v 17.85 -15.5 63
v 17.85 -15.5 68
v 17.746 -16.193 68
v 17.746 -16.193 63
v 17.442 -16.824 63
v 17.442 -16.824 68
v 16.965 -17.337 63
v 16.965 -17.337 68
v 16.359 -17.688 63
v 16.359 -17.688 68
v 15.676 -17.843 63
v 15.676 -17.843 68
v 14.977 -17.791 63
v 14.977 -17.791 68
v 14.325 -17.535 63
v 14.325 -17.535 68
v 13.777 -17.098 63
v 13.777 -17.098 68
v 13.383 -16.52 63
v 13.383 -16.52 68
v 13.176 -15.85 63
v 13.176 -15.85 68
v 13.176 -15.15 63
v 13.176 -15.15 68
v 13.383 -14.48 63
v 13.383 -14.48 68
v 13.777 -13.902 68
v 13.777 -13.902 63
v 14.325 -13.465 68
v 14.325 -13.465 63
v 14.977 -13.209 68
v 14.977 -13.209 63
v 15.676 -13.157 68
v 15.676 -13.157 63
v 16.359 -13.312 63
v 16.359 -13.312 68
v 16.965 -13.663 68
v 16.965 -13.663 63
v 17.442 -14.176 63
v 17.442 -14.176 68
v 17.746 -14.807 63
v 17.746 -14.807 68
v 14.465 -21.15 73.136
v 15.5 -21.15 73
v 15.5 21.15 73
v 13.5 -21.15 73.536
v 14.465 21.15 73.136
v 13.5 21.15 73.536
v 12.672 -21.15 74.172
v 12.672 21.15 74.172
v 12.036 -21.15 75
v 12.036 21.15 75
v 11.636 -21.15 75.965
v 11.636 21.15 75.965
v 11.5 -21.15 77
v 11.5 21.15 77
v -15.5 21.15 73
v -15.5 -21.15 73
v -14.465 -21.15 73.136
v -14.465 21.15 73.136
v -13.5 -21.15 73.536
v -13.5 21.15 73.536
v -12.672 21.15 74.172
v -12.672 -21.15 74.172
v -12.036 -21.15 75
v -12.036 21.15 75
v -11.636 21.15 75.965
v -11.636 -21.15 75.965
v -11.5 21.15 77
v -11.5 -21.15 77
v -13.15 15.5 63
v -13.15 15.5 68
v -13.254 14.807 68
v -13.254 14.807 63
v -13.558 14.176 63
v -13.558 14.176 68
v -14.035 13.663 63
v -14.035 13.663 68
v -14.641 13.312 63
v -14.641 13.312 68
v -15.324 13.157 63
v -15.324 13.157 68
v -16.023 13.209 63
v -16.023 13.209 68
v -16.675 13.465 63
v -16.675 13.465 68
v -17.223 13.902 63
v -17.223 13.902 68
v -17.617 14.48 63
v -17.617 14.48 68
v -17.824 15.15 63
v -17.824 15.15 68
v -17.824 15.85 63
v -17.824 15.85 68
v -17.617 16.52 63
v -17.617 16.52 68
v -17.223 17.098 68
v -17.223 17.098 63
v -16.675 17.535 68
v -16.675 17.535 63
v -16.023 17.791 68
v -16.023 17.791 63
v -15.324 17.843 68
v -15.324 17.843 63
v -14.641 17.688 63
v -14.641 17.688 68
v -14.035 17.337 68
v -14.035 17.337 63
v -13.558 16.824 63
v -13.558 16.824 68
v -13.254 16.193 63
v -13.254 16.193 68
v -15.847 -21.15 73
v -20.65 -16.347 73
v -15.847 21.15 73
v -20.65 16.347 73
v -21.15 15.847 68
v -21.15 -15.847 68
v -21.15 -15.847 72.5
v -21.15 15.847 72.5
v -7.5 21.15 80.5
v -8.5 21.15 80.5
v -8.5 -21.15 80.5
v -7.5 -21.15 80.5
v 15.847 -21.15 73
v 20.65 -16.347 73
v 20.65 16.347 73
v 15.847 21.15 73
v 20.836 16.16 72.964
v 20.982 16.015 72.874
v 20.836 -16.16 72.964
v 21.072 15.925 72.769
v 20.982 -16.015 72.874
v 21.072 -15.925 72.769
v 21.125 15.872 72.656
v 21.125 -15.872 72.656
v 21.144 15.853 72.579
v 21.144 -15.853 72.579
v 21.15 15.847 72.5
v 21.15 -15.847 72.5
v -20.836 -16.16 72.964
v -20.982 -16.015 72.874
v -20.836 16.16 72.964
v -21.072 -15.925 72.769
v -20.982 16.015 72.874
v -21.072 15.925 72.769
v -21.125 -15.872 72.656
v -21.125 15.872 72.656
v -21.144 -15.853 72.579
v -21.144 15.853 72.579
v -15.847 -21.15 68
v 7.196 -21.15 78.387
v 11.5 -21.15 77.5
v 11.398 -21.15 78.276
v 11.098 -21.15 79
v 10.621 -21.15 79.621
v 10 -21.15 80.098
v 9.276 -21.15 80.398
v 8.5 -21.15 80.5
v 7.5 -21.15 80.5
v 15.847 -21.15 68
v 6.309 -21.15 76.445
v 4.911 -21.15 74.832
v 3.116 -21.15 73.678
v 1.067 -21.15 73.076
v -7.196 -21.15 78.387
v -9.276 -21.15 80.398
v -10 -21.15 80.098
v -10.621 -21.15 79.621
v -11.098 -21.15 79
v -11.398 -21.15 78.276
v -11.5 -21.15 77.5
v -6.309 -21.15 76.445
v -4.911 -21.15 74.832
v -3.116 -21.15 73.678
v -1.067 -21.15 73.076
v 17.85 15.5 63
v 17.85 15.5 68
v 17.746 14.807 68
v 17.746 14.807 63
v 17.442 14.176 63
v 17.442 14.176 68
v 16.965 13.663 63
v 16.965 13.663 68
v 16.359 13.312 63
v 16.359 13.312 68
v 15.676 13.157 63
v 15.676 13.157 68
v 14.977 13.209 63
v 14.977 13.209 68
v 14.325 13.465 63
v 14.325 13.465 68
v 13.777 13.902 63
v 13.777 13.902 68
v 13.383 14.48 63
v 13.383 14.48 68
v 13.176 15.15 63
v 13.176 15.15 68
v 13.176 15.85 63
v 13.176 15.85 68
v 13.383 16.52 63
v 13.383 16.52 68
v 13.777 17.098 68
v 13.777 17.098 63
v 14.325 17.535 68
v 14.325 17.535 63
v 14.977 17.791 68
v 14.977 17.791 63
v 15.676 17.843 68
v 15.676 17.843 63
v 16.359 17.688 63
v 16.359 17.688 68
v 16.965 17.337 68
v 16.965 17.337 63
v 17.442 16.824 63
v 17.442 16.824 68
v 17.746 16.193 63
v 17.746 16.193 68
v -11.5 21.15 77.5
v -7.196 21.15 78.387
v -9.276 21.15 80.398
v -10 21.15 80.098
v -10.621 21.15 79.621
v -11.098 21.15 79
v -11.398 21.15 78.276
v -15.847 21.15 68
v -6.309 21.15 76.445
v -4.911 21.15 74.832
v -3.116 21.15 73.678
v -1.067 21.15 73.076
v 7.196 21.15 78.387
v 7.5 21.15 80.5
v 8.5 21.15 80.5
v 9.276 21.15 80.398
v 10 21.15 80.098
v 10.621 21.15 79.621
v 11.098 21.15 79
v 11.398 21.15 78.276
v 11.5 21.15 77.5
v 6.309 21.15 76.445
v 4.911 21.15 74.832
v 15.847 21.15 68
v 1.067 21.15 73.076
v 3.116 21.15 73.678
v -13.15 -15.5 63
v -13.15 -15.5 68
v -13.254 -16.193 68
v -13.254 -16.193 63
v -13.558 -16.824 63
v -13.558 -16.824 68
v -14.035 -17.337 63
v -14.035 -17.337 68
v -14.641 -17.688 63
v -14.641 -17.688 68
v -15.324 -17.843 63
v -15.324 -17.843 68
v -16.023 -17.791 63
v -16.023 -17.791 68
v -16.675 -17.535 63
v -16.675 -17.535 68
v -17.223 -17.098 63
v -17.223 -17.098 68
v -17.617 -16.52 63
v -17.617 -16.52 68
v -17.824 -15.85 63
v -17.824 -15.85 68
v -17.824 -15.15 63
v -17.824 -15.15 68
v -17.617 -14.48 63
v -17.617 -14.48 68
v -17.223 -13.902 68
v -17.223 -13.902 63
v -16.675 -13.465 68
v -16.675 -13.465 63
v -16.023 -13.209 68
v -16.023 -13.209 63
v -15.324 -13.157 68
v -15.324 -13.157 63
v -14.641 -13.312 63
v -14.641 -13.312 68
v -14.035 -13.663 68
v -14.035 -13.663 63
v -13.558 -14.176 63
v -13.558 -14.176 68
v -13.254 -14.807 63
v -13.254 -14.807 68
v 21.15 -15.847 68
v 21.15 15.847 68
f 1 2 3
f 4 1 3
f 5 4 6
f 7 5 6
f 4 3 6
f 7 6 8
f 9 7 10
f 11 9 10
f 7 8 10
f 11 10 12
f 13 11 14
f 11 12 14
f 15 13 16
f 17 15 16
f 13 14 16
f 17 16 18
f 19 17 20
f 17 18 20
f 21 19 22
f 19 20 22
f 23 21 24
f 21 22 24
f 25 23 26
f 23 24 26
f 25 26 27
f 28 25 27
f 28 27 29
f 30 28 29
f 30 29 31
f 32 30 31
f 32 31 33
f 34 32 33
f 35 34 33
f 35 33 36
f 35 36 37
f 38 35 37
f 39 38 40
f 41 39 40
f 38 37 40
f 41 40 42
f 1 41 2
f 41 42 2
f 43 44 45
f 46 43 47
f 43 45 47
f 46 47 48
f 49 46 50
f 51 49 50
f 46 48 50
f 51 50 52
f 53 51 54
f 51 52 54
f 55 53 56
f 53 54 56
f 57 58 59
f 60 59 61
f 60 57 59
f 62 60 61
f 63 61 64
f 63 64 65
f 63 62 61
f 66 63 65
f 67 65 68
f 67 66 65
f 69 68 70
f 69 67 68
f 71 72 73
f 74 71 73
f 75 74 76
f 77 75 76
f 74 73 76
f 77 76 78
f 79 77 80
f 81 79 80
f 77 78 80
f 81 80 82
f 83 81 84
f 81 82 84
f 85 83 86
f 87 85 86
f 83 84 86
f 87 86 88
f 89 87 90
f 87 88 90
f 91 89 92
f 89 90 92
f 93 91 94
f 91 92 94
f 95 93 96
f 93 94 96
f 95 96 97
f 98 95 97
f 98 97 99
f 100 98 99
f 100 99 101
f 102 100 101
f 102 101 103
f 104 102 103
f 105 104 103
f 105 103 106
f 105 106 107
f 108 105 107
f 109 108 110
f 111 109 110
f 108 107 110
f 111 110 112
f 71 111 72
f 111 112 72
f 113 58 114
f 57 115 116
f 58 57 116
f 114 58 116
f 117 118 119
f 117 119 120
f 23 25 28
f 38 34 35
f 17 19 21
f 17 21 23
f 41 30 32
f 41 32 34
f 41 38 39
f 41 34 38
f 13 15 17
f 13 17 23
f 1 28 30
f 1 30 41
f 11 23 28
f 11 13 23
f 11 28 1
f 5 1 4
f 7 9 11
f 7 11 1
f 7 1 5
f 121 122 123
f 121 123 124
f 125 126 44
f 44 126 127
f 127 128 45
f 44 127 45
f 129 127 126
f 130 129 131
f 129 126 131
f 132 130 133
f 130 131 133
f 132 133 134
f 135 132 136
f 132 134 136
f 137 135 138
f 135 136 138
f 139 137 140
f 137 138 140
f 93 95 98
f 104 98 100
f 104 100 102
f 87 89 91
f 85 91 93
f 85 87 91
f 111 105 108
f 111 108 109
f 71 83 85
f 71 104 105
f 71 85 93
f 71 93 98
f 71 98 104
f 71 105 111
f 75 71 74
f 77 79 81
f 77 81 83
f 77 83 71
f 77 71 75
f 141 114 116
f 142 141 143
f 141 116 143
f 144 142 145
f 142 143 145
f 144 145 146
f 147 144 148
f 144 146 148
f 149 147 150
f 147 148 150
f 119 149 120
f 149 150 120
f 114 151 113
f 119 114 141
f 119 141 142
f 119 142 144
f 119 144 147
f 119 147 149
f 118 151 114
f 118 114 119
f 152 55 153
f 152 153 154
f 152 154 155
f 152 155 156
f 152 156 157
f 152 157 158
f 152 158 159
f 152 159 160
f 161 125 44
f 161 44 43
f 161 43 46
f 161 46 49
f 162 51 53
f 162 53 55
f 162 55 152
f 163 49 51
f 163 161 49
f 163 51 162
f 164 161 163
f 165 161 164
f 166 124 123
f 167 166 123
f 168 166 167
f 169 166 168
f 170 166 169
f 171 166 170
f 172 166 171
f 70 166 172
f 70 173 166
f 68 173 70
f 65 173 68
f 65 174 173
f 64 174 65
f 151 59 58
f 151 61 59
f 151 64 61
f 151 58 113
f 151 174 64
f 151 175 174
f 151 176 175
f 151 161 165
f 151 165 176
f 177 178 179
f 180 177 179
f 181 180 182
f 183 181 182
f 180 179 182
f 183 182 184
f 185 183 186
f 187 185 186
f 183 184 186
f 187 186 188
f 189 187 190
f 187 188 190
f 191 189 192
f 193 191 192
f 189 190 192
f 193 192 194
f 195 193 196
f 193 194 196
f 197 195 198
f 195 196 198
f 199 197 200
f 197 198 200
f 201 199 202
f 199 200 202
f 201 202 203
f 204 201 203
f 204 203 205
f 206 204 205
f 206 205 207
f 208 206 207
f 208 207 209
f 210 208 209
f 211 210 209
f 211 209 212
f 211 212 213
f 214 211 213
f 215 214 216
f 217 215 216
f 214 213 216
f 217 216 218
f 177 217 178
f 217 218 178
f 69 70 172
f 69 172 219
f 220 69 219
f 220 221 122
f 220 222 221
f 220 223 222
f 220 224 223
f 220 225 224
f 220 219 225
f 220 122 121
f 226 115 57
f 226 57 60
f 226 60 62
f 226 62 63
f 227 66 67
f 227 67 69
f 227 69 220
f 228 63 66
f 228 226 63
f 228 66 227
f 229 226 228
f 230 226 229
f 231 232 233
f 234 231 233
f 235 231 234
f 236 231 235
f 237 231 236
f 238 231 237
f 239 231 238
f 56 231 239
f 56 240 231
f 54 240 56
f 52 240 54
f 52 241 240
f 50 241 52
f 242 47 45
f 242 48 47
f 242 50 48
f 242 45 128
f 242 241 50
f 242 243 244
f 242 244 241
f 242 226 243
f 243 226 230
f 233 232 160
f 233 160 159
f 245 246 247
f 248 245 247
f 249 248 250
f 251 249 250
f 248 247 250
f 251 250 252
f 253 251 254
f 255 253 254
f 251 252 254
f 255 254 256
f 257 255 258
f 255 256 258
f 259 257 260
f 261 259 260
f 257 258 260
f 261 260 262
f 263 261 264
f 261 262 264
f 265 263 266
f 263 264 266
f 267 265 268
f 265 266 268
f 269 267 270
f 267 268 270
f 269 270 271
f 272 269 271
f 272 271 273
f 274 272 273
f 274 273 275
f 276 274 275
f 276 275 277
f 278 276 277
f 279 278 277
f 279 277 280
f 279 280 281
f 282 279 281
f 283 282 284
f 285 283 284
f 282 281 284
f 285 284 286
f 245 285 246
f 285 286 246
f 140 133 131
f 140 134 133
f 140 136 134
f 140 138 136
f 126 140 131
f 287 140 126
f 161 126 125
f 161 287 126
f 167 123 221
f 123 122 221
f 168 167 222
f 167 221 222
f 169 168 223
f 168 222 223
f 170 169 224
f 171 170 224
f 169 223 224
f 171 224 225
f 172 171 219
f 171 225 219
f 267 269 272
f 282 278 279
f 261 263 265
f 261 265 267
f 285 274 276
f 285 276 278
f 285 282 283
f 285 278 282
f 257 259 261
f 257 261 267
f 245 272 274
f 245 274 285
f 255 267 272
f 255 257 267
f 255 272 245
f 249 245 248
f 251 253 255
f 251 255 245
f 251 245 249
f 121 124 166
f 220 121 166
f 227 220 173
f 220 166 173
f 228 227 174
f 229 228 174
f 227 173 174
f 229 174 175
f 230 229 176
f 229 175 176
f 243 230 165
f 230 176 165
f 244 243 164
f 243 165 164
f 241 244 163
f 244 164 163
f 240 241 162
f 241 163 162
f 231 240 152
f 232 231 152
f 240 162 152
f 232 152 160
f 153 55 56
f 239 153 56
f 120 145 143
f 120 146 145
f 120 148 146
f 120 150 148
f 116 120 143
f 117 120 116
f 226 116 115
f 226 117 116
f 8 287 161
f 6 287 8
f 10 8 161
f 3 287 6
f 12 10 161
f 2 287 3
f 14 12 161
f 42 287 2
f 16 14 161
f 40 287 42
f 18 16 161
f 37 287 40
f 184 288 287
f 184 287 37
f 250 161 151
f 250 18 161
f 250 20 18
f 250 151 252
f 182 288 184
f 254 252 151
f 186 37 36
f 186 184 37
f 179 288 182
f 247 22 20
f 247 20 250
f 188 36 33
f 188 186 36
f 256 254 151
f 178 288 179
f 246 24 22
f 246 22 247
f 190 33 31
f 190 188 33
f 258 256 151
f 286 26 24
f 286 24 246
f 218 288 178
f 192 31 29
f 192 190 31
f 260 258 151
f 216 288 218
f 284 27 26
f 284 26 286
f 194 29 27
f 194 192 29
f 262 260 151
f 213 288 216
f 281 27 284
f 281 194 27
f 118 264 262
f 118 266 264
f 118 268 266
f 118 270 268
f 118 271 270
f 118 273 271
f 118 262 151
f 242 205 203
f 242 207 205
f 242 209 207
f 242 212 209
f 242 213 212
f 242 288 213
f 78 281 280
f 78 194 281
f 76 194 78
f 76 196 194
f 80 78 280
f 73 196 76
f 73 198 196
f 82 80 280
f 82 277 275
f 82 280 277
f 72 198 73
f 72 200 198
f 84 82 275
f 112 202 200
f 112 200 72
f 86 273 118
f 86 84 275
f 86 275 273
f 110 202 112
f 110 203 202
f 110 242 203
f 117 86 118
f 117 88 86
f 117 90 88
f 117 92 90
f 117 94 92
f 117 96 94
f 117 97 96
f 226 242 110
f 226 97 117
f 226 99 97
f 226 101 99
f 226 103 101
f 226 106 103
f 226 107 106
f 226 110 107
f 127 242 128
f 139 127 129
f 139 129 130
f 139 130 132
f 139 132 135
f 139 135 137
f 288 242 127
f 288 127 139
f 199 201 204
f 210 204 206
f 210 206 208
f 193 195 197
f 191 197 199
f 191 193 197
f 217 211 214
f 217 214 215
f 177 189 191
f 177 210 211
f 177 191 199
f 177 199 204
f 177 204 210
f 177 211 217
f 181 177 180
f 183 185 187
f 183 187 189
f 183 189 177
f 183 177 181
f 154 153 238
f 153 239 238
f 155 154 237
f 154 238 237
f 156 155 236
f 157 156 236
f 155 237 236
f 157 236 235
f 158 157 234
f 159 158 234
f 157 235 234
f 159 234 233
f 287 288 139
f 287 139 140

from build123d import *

# Parameters (mm, degrees)
PAD_DEPTH       = 5
SKETCH056_R     = 2.35
PAD023_DEPTH    = 5
SKETCH057_W     = 23
SKETCH057_H     = 42.3
PAD024_DEPTH    = 7.5
SKETCH058_R     = 7.5
POCKET013_DEPTH = 100
FILLET_R        = 4
FILLET002_R     = 3
FILLET003_R     = 0.5


with BuildPart() as part:
    # Sketch (on Face1 of Binder) → Pad (new body)
    with BuildSketch(Plane.XY.offset(68)):
        Polygon((-21.15, 15.8466991411), (-15.8466991411, 21.15), (15.8466991411, 21.15), (21.15, 15.8466991411), (21.15, -15.8466991411), (15.8466991411, -21.15), (-15.8466991411, -21.15), (-21.15, -15.8466991411), align=None)
    extrude(amount=PAD_DEPTH)

    # Sketch056 (on Face9 of Pad) → Pad023 (join)
    with BuildSketch(Plane(origin=(0, 0, 68), x_dir=(1, 0, 0), z_dir=(0, 0, -1))):
        with Locations((15.5, 15.5)):
            Circle(SKETCH056_R)
        with Locations((15.5, -15.5)):
            Circle(SKETCH056_R)
        with Locations((-15.5, -15.5)):
            Circle(SKETCH056_R)
        with Locations((-15.5, 15.5)):
            Circle(SKETCH056_R)
    extrude(amount=PAD023_DEPTH)

    # Sketch057 (on Face5 of Pad023) → Pad024 (join)
    with BuildSketch(Plane.XY.offset(73)):
        Rectangle(SKETCH057_W, SKETCH057_H)
    extrude(amount=PAD024_DEPTH)

    # Sketch058 (on Face20 of Pad024) → Pocket013 (cut)
    with BuildSketch(Plane.XZ.offset(21.15)):
        with Locations((0, 80.5)):
            Circle(SKETCH058_R)
    extrude(amount=-POCKET013_DEPTH, mode=Mode.SUBTRACT)

    # Fillet
    fillet_edges = [part.edges().sort_by_distance(p)[0] for p in [
        (11.5, 0, 73),
        (-11.5, 0, 73),
    ]]
    fillet(fillet_edges, radius=FILLET_R)

    # Fillet002
    fillet002_edges = [part.edges().sort_by_distance(p)[0] for p in [
        (-11.5, 0, 80.5),
        (11.5, 0, 80.5),
    ]]
    fillet(fillet002_edges, radius=FILLET002_R)

    # Fillet003
    fillet003_edges = [part.edges().sort_by_distance(p)[0] for p in [
        (21.15, 0, 73),
        (-21.15, 0, 73),
    ]]
    fillet(fillet003_edges, radius=FILLET003_R)


solid = part.part
